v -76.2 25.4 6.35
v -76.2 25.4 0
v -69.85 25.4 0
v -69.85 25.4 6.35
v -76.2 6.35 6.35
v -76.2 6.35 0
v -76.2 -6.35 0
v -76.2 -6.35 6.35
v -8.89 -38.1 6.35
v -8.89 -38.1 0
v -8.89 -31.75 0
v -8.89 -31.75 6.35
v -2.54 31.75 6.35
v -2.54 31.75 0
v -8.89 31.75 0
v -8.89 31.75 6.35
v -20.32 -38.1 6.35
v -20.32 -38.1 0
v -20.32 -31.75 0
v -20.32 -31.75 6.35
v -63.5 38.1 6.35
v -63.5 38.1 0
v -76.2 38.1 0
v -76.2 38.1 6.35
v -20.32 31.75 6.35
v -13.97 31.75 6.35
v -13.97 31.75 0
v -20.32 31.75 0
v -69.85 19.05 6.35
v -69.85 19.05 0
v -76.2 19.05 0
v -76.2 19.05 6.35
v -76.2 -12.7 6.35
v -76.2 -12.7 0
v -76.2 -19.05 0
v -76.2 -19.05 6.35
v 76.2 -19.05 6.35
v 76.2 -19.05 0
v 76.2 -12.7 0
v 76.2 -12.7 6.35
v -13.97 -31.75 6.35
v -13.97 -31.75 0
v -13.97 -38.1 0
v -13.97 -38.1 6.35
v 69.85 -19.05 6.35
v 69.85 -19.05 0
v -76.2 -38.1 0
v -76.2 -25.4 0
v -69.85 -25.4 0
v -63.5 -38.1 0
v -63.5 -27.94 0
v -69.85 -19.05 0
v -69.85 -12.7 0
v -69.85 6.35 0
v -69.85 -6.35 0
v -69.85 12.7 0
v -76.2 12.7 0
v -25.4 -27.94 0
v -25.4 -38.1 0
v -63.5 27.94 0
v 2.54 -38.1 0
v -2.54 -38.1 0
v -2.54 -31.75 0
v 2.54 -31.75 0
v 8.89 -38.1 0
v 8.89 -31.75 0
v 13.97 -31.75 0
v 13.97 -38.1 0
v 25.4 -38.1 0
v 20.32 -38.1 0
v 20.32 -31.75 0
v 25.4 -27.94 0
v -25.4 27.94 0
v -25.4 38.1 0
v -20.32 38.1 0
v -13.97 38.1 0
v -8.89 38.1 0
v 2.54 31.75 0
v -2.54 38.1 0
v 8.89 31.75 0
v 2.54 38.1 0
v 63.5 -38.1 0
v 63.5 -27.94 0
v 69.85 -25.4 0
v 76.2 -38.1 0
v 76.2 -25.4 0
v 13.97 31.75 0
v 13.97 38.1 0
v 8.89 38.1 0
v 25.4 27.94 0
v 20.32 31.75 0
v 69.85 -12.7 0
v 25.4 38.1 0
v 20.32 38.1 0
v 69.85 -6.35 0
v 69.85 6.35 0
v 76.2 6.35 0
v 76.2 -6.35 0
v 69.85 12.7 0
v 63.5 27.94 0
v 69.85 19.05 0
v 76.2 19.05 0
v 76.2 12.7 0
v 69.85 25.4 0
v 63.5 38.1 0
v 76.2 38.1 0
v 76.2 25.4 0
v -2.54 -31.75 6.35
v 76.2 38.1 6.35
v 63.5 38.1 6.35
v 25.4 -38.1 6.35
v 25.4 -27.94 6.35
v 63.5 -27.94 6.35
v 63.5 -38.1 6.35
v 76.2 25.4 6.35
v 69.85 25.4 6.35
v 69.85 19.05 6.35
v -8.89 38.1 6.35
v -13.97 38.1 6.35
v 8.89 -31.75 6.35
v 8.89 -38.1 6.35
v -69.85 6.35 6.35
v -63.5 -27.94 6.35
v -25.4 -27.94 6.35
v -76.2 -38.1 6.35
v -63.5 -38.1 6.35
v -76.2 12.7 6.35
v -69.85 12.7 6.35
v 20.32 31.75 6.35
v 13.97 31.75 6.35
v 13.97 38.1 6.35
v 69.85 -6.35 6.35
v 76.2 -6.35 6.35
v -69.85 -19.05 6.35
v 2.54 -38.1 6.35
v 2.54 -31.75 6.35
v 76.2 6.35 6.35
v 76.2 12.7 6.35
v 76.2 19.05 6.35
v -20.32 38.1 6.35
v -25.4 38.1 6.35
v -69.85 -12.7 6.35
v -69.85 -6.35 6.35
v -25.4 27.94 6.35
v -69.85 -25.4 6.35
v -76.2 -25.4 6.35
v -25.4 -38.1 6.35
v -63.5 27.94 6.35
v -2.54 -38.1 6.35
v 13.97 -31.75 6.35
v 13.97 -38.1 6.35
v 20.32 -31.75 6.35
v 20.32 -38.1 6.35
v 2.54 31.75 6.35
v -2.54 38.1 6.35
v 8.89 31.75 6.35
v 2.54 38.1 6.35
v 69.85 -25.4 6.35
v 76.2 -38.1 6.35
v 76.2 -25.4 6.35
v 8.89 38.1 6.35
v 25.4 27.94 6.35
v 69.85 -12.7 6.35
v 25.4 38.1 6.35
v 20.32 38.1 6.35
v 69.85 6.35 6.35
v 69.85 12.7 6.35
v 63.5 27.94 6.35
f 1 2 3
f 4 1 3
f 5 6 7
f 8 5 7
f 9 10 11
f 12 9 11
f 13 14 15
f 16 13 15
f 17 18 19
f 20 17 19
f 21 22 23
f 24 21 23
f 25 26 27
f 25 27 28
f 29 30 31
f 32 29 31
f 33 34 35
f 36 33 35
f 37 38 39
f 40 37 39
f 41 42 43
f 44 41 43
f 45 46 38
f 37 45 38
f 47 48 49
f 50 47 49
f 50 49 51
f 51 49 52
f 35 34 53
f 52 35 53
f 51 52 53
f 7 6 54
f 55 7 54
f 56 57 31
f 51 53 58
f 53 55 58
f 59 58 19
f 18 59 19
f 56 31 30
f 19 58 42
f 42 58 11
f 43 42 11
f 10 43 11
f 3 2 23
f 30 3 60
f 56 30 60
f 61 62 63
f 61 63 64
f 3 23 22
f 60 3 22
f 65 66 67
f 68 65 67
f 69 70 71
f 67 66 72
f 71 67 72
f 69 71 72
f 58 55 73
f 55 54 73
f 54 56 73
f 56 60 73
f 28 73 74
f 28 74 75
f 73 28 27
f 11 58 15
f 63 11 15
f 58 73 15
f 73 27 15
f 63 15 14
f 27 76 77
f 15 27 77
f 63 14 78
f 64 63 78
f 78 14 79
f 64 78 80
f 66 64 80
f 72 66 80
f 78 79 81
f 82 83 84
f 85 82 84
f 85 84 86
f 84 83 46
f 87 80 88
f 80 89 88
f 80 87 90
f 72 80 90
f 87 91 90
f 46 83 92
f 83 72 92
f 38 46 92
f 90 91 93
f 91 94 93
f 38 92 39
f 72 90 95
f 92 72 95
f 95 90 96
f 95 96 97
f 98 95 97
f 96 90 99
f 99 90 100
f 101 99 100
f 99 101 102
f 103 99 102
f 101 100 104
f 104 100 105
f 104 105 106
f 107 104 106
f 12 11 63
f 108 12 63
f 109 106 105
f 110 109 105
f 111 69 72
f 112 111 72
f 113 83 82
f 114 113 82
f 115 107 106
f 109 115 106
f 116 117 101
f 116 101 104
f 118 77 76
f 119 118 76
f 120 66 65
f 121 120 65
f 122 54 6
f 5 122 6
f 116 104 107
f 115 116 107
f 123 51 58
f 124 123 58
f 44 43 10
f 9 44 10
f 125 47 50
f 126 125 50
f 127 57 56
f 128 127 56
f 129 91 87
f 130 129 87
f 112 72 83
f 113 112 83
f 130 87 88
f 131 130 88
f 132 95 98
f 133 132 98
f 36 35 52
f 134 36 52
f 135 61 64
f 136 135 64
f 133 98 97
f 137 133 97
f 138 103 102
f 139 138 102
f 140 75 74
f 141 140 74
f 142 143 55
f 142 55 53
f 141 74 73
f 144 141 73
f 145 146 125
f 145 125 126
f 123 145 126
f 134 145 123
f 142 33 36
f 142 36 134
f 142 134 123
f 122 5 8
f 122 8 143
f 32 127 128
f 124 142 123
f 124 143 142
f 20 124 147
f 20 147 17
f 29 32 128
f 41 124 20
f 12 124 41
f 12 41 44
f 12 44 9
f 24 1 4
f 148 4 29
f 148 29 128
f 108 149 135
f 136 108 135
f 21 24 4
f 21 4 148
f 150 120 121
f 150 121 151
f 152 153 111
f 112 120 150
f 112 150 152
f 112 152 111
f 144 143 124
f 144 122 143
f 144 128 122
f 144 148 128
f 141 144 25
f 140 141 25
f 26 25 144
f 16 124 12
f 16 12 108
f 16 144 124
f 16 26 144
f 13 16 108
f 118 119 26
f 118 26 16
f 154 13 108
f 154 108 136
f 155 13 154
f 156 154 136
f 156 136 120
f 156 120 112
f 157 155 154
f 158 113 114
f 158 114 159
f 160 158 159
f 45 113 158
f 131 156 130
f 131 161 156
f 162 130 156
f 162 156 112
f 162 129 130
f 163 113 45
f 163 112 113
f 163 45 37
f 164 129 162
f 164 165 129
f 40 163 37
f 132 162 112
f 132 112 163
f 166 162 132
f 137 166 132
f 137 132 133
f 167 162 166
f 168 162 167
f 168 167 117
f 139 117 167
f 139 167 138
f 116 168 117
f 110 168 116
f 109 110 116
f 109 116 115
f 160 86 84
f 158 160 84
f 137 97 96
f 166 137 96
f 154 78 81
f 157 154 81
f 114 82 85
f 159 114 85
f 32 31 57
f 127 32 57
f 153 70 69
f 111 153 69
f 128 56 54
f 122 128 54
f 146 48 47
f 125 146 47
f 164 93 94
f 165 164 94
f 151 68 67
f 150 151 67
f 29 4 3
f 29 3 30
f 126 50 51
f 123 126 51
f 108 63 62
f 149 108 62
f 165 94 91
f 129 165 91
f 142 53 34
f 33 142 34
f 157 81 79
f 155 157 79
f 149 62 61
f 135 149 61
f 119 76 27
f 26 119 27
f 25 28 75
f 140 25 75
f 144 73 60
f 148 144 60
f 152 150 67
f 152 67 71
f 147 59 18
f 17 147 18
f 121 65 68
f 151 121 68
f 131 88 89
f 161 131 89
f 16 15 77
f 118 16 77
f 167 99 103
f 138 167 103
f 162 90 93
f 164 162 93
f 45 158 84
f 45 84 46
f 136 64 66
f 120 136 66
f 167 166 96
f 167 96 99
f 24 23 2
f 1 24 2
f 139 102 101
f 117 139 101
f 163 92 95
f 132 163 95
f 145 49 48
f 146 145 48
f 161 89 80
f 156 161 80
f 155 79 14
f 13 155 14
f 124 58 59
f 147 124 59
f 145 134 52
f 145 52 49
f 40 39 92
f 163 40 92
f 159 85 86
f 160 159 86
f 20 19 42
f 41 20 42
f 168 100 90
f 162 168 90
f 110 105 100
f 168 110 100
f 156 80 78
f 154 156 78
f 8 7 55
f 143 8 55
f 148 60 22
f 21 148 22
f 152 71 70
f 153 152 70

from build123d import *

# Parameters (mm, degrees)
F1_DEPTH = 6.35


with BuildPart() as f1:
    # F0 (on Top) → F1 (new body)
    with BuildSketch(Plane.XY):
        Polygon((-76.2, 0), (0, 0), (0, 38.1), (-2.54, 38.1), (-2.54, 31.75), (-8.89, 31.75), (-8.89, 38.1), (-13.97, 38.1), (-13.97, 31.75), (-20.32, 31.75), (-20.32, 38.1), (-25.4, 38.1), (-25.4, 27.94), (-63.5, 27.94), (-63.5, 38.1), (-76.2, 38.1), (-76.2, 25.4), (-69.85, 25.4), (-69.85, 19.05), (-76.2, 19.05), (-76.2, 12.7), (-69.85, 12.7), (-69.85, 6.35), (-76.2, 6.35), align=None)
        Polygon((0, -38.1), (0, 0), (-76.2, 0), (-76.2, -6.35), (-69.85, -6.35), (-69.85, -12.7), (-76.2, -12.7), (-76.2, -19.05), (-69.85, -19.05), (-69.85, -25.4), (-76.2, -25.4), (-76.2, -38.1), (-63.5, -38.1), (-63.5, -27.94), (-25.4, -27.94), (-25.4, -38.1), (-20.32, -38.1), (-20.32, -31.75), (-13.97, -31.75), (-13.97, -38.1), (-8.89, -38.1), (-8.89, -31.75), (-2.54, -31.75), (-2.54, -38.1), align=None)
        Polygon((63.5, -38.1), (76.2, -38.1), (76.2, -25.4), (69.85, -25.4), (69.85, -19.05), (76.2, -19.05), (76.2, -12.7), (69.85, -12.7), (69.85, -6.35), (76.2, -6.35), (76.2, 0), (0, 0), (0, -38.1), (2.54, -38.1), (2.54, -31.75), (8.89, -31.75), (8.89, -38.1), (13.97, -38.1), (13.97, -31.75), (20.32, -31.75), (20.32, -38.1), (25.4, -38.1), (25.4, -27.94), (63.5, -27.94), align=None)
        Polygon((0, 0), (76.2, 0), (76.2, 6.35), (69.85, 6.35), (69.85, 12.7), (76.2, 12.7), (76.2, 19.05), (69.85, 19.05), (69.85, 25.4), (76.2, 25.4), (76.2, 38.1), (63.5, 38.1), (63.5, 27.94), (25.4, 27.94), (25.4, 38.1), (20.32, 38.1), (20.32, 31.75), (13.97, 31.75), (13.97, 38.1), (8.89, 38.1), (8.89, 31.75), (2.54, 31.75), (2.54, 38.1), (0, 38.1), align=None)
    extrude(amount=F1_DEPTH)


solid = f1.part
